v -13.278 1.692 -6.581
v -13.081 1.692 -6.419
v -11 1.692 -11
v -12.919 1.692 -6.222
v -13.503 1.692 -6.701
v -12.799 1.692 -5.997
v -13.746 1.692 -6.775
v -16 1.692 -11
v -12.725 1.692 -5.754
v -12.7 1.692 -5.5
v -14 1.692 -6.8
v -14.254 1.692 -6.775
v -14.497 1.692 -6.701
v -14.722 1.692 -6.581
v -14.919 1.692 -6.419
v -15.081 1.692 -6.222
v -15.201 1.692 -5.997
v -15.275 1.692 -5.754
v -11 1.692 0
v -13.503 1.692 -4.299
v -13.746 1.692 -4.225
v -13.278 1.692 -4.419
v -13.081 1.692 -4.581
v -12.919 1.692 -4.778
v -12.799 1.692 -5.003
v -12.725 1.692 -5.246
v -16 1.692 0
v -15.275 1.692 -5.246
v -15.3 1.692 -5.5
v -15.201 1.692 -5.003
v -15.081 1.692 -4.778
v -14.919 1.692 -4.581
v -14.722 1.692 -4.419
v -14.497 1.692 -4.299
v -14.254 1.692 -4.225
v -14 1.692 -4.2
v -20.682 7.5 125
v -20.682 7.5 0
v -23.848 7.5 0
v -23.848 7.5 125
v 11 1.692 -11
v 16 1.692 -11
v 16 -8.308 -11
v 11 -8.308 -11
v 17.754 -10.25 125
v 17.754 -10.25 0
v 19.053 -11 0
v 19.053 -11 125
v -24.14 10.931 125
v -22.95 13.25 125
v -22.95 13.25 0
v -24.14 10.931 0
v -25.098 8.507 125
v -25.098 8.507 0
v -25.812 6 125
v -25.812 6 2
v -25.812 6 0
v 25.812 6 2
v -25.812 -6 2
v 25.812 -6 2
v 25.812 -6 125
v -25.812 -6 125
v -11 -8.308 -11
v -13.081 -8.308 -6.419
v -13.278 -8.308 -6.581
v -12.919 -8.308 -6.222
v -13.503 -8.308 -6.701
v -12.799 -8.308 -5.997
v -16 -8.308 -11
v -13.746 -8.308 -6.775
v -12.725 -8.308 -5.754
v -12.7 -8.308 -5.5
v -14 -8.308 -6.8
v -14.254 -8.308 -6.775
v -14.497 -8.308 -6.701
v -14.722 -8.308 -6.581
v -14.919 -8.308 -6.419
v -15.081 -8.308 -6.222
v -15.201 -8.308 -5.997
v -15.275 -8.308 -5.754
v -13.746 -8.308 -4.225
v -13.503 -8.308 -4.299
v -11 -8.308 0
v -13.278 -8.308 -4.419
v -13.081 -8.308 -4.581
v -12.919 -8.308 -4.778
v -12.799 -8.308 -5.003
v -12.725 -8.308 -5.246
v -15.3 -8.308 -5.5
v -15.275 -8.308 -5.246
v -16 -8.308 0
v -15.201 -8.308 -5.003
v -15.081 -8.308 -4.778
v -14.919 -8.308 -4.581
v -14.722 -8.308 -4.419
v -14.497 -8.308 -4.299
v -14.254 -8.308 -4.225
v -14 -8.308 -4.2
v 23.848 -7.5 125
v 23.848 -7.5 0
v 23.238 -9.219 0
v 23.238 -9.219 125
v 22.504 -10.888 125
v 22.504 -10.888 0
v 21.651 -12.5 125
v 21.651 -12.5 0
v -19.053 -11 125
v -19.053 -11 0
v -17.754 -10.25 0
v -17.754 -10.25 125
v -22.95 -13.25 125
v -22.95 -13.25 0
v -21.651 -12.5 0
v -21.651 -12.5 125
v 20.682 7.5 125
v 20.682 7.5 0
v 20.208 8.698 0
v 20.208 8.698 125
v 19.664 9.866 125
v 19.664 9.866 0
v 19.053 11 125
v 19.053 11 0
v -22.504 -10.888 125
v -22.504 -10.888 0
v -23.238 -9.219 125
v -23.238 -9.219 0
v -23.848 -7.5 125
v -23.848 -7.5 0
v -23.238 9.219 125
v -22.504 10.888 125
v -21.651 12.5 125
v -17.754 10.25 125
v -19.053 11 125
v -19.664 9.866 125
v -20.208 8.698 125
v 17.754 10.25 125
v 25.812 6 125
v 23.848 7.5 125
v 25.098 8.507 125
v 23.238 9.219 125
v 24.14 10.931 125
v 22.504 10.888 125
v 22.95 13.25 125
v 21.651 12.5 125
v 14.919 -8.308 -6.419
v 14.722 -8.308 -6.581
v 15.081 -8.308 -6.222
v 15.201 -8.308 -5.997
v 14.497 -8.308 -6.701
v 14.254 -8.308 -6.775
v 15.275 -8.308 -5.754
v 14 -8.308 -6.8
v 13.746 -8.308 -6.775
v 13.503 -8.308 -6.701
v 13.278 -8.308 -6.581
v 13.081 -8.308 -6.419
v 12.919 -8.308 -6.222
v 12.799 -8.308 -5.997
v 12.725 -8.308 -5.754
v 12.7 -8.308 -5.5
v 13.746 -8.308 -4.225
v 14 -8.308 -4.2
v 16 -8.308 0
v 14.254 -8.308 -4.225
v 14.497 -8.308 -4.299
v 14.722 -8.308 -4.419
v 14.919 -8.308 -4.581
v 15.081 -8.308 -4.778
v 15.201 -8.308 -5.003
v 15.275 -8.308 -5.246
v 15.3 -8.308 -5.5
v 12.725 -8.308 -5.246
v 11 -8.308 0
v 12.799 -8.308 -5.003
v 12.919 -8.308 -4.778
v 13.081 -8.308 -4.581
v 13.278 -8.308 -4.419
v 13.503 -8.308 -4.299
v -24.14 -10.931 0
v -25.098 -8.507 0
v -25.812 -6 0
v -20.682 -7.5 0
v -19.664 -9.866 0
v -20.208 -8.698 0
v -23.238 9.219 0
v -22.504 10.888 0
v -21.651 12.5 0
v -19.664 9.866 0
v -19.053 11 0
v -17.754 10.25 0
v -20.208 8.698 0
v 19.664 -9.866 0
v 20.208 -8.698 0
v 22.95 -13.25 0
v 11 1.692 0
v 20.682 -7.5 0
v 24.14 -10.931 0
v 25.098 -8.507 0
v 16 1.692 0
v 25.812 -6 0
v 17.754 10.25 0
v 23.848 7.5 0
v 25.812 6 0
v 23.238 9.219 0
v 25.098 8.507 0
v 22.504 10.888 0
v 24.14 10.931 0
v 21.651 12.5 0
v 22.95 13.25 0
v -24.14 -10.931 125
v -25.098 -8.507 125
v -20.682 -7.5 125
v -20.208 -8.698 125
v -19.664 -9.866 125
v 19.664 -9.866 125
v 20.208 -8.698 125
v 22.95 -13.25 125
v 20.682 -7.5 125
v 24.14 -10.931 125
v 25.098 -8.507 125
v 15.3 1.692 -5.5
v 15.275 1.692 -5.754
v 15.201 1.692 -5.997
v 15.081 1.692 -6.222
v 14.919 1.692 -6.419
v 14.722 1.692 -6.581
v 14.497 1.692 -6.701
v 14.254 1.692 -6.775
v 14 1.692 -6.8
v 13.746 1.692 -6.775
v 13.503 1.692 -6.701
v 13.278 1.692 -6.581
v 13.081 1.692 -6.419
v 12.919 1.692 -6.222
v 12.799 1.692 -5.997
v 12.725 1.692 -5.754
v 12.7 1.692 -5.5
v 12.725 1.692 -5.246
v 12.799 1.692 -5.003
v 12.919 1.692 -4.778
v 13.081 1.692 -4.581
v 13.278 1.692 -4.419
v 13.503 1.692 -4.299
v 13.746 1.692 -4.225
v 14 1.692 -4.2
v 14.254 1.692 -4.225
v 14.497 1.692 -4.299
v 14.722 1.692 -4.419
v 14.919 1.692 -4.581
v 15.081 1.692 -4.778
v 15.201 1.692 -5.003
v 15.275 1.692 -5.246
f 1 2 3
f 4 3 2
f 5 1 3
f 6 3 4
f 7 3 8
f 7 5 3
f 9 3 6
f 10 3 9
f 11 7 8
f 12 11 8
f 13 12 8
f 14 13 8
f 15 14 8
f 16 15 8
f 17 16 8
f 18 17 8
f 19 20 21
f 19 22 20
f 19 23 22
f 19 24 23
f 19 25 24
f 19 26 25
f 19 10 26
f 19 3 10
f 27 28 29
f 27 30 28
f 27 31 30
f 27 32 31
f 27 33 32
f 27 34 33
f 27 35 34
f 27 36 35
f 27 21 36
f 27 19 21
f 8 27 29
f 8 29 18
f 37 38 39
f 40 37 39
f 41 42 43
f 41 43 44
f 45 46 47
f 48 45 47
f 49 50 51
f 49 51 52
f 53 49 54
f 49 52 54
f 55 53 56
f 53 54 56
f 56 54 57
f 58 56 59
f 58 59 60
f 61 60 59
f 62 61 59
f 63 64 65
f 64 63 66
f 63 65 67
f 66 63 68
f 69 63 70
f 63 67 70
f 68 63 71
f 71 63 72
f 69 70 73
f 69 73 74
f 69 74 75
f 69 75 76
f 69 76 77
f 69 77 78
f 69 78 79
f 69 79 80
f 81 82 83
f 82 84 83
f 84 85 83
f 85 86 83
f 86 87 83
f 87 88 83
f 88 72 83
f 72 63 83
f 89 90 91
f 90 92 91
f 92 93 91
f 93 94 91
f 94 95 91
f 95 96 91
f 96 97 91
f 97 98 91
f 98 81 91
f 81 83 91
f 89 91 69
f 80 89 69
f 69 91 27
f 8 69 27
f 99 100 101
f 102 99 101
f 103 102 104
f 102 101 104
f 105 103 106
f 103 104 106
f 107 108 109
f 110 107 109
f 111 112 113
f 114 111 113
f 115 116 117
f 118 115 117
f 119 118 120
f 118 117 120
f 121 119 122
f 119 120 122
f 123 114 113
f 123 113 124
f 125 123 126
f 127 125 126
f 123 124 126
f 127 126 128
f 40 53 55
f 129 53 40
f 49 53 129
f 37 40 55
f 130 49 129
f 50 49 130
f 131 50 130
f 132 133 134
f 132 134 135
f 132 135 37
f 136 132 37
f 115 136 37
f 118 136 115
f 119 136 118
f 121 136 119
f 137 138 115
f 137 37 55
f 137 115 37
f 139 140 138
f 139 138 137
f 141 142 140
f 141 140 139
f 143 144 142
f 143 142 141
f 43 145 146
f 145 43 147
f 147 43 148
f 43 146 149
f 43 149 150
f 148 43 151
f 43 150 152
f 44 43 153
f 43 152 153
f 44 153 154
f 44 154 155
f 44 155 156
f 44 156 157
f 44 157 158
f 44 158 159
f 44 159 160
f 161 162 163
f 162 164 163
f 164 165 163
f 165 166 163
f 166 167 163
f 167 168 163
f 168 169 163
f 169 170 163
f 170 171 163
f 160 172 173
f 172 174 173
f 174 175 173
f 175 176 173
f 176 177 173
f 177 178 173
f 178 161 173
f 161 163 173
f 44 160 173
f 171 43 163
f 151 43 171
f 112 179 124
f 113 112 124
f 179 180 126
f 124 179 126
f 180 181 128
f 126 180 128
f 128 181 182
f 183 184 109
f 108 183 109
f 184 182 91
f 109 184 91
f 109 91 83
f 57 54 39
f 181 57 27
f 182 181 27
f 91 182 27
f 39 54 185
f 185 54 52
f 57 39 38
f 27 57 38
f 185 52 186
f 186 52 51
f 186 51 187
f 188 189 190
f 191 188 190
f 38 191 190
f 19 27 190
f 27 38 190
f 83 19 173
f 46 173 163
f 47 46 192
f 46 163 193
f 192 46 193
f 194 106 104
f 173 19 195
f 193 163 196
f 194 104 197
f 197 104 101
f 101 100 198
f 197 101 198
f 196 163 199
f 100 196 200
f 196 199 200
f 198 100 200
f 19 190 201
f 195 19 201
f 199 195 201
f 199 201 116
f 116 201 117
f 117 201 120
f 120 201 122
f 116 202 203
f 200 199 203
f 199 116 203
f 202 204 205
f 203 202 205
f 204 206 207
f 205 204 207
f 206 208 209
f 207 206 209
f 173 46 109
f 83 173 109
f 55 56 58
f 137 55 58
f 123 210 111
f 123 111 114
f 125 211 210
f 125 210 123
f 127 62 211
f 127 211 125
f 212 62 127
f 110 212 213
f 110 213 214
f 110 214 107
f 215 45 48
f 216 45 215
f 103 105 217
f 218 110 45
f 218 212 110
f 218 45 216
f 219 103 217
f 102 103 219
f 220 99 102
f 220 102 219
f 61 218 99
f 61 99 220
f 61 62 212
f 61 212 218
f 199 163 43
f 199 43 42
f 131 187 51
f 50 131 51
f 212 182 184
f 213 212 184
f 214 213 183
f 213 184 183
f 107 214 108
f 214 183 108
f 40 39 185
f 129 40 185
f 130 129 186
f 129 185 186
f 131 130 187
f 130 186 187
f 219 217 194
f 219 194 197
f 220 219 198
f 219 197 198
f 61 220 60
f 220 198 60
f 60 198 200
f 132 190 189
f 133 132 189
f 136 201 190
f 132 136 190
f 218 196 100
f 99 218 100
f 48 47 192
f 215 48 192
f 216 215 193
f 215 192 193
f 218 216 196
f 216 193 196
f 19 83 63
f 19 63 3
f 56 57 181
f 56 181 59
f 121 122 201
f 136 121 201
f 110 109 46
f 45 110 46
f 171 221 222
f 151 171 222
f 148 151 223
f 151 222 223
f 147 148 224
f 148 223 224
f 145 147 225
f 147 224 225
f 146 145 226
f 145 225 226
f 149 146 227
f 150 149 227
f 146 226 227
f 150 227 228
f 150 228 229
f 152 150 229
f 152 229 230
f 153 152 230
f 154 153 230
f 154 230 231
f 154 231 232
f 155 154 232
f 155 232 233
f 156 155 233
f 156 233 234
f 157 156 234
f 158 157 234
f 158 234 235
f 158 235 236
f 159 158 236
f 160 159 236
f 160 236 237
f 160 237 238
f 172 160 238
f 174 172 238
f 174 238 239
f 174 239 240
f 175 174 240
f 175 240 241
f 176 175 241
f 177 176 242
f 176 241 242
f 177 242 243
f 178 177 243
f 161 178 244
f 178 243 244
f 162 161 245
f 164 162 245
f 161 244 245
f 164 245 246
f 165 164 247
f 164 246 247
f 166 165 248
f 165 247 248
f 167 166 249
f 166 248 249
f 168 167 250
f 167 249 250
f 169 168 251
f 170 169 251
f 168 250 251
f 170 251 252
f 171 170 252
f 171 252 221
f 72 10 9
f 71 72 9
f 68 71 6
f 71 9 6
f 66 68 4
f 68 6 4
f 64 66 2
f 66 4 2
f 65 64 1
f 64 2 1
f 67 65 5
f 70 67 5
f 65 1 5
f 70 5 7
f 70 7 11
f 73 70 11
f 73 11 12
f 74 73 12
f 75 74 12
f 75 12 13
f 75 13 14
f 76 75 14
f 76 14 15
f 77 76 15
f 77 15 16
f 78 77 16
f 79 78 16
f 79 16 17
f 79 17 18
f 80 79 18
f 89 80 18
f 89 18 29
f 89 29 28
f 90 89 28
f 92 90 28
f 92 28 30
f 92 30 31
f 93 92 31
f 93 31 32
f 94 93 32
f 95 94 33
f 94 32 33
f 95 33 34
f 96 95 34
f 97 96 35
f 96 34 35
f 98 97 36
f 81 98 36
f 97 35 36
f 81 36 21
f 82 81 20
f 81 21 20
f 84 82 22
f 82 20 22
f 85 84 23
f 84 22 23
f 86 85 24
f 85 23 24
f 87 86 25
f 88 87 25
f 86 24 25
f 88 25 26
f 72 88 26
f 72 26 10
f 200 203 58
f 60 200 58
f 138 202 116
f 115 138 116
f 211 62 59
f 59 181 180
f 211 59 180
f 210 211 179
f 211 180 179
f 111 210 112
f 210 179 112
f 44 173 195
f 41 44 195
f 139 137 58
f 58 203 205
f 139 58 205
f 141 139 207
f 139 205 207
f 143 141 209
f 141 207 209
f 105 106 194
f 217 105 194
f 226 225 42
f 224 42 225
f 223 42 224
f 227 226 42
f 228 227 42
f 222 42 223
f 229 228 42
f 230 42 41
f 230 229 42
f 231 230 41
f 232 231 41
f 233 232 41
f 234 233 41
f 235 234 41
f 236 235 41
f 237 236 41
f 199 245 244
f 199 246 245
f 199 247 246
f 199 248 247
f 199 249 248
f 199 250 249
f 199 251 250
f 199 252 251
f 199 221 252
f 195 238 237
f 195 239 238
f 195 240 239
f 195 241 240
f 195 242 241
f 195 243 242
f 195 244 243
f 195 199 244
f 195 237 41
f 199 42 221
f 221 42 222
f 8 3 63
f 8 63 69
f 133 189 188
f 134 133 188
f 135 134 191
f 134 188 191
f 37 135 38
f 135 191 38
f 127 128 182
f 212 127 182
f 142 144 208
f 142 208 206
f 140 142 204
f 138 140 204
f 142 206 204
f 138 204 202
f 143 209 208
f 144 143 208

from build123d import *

# Parameters (mm, degrees)
BOSS_EXTRUDE2_DEPTH = 125
SKETCH2_W           = 51.623637996
SKETCH2_H           = 2
BOSS_EXTRUDE3_DEPTH = 12
SKETCH3_W           = 5
SKETCH3_H           = 10
BOSS_EXTRUDE4_DEPTH = 11
CUT_EXTRUDE1_REACH  = 16.942
SKETCH4_R           = 1.3


with BuildPart() as part:
    # Model → Boss-Extrude2 (new body)
    with BuildSketch(Plane.XY):
        with BuildLine():
            ThreePointArc((25.811818998, 6), (24.648760727, 9.730806474), (22.9496732, 13.25))
            Line((22.9496732, 13.25), (21.650635095, 12.5))
            ThreePointArc((21.650635095, 12.5), (22.886510643, 10.060200326), (23.848480035, 7.5))
            ThreePointArc((23.848480035, 7.5), (24.070588339, 6.753278984), (24.269322199, 6))
            Line((24.269322199, 6), (25.811818998, 6))
        make_face()
        with BuildLine():
            ThreePointArc((24.269322199, 6), (24.070588339, 6.753278984), (23.848480035, 7.5))
            Line((23.848480035, 7.5), (23.323807579, 7.5))
            Line((23.323807579, 7.5), (21.213203436, 7.5))
            Line((21.213203436, 7.5), (20.68211788, 7.5))
            ThreePointArc((20.68211788, 7.5), (20.937501331, 6.754334757), (21.166010489, 6))
            Line((21.166010489, 6), (24.269322199, 6))
        make_face()
        with BuildLine():
            Line((19.602295784, 6), (21.166010489, 6))
            ThreePointArc((21.166010489, 6), (20.937501331, 6.754334757), (20.68211788, 7.5))
            ThreePointArc((20.68211788, 7.5), (19.944263194, 9.285815292), (19.052558883, 11))
            Line((19.052558883, 11), (17.753520778, 10.25))
            ThreePointArc((17.753520778, 10.25), (18.798401069, 8.177415072), (19.602295784, 6))
        make_face()
        with BuildLine():
            Line((10.392304845, 6), (19.602295784, 6))
            ThreePointArc((19.602295784, 6), (18.798401069, 8.177415072), (17.753520778, 10.25))
            Line((17.753520778, 10.25), (10.392304845, 6))
        make_face()
        Polygon((17.753520778, 10.25), (-17.753520778, 10.25), (-10.392304845, 6), (10.392304845, 6), align=None)
        with BuildLine():
            Line((-17.753520778, 10.25), (-19.052558883, 11))
            ThreePointArc((-19.052558883, 11), (-19.944263194, 9.285815292), (-20.68211788, 7.5))
            ThreePointArc((-20.68211788, 7.5), (-20.937501331, 6.754334757), (-21.166010489, 6))
            Line((-21.166010489, 6), (-19.602295784, 6))
            ThreePointArc((-19.602295784, 6), (-18.798401069, 8.177415072), (-17.753520778, 10.25))
        make_face()
        with BuildLine():
            Line((-21.213203436, 7.5), (-23.323807579, 7.5))
            ThreePointArc((-23.323807579, 7.5), (-23.550822597, 6.753425426), (-23.75394704, 6))
            Line((-23.75394704, 6), (-21.685248442, 6))
            ThreePointArc((-21.685248442, 6), (-21.462334295, 6.754125156), (-21.213203436, 7.5))
        make_face()
        with BuildLine():
            Line((-23.323807579, 7.5), (-23.848480035, 7.5))
            ThreePointArc((-23.848480035, 7.5), (-24.070588339, 6.753278984), (-24.269322199, 6))
            Line((-24.269322199, 6), (-23.75394704, 6))
            ThreePointArc((-23.75394704, 6), (-23.550822597, 6.753425426), (-23.323807579, 7.5))
        make_face()
        with BuildLine():
            Line((-20.68211788, 7.5), (-21.213203436, 7.5))
            ThreePointArc((-21.213203436, 7.5), (-21.462334295, 6.754125156), (-21.685248442, 6))
            Line((-21.685248442, 6), (-21.166010489, 6))
            ThreePointArc((-21.166010489, 6), (-20.937501331, 6.754334757), (-20.68211788, 7.5))
        make_face()
        with BuildLine():
            Line((-21.650635095, 12.5), (-22.9496732, 13.25))
            ThreePointArc((-22.9496732, 13.25), (-24.648760727, 9.730806474), (-25.811818998, 6))
            Line((-25.811818998, 6), (-24.269322199, 6))
            ThreePointArc((-24.269322199, 6), (-24.070588339, 6.753278984), (-23.848480035, 7.5))
            ThreePointArc((-23.848480035, 7.5), (-22.886510643, 10.060200326), (-21.650635095, 12.5))
        make_face()
        with BuildLine():
            Line((-10.392304845, 6), (-17.753520778, 10.25))
            ThreePointArc((-17.753520778, 10.25), (-18.798401069, 8.177415072), (-19.602295784, 6))
            Line((-19.602295784, 6), (-10.392304845, 6))
        make_face()
        with BuildLine():
            Line((-24.269322199, -6), (-25.811818998, -6))
            ThreePointArc((-25.811818998, -6), (-24.648760727, -9.730806474), (-22.9496732, -13.25))
            Line((-22.9496732, -13.25), (-21.650635095, -12.5))
            ThreePointArc((-21.650635095, -12.5), (-22.886510643, -10.060200326), (-23.848480035, -7.5))
            ThreePointArc((-23.848480035, -7.5), (-24.070588339, -6.753278984), (-24.269322199, -6))
        make_face()
        with BuildLine():
            Line((-23.75394704, -6), (-24.269322199, -6))
            ThreePointArc((-24.269322199, -6), (-24.070588339, -6.753278984), (-23.848480035, -7.5))
            Line((-23.848480035, -7.5), (-23.323807579, -7.5))
            ThreePointArc((-23.323807579, -7.5), (-23.550822597, -6.753425426), (-23.75394704, -6))
        make_face()
        with BuildLine():
            Line((-21.685248442, -6), (-23.75394704, -6))
            ThreePointArc((-23.75394704, -6), (-23.550822597, -6.753425426), (-23.323807579, -7.5))
            Line((-23.323807579, -7.5), (-21.213203436, -7.5))
            ThreePointArc((-21.213203436, -7.5), (-21.462334295, -6.754125156), (-21.685248442, -6))
        make_face()
        with BuildLine():
            Line((-21.166010489, -6), (-21.685248442, -6))
            ThreePointArc((-21.685248442, -6), (-21.462334295, -6.754125156), (-21.213203436, -7.5))
            Line((-21.213203436, -7.5), (-20.68211788, -7.5))
            ThreePointArc((-20.68211788, -7.5), (-20.937501331, -6.754334757), (-21.166010489, -6))
        make_face()
        with BuildLine():
            Line((-19.602295784, -6), (-21.166010489, -6))
            ThreePointArc((-21.166010489, -6), (-20.937501331, -6.754334757), (-20.68211788, -7.5))
            ThreePointArc((-20.68211788, -7.5), (-19.944263194, -9.285815292), (-19.052558883, -11))
            Line((-19.052558883, -11), (-17.753520778, -10.25))
            ThreePointArc((-17.753520778, -10.25), (-18.798401069, -8.177415072), (-19.602295784, -6))
        make_face()
        with BuildLine():
            Line((-17.753520778, -10.25), (-10.392304845, -6))
            Line((-10.392304845, -6), (-19.602295784, -6))
            ThreePointArc((-19.602295784, -6), (-18.798401069, -8.177415072), (-17.753520778, -10.25))
        make_face()
        Polygon((17.753520778, -10.25), (10.392304845, -6), (-10.392304845, -6), (-17.753520778, -10.25), align=None)
        with BuildLine():
            ThreePointArc((17.753520778, -10.25), (18.798401069, -8.177415072), (19.602295784, -6))
            Line((19.602295784, -6), (10.392304845, -6))
            Line((10.392304845, -6), (17.753520778, -10.25))
        make_face()
        with BuildLine():
            ThreePointArc((20.68211788, -7.5), (20.937501331, -6.754334757), (21.166010489, -6))
            Line((21.166010489, -6), (19.602295784, -6))
            ThreePointArc((19.602295784, -6), (18.798401069, -8.177415072), (17.753520778, -10.25))
            Line((17.753520778, -10.25), (19.052558883, -11))
            ThreePointArc((19.052558883, -11), (19.944263194, -9.285815292), (20.68211788, -7.5))
        make_face()
        with BuildLine():
            ThreePointArc((23.848480035, -7.5), (24.070588339, -6.753278984), (24.269322199, -6))
            Line((24.269322199, -6), (21.166010489, -6))
            ThreePointArc((21.166010489, -6), (20.937501331, -6.754334757), (20.68211788, -7.5))
            Line((20.68211788, -7.5), (21.213203436, -7.5))
            Line((21.213203436, -7.5), (23.323807579, -7.5))
            Line((23.323807579, -7.5), (23.848480035, -7.5))
        make_face()
        with BuildLine():
            ThreePointArc((22.9496732, -13.25), (24.648760727, -9.730806474), (25.811818998, -6))
            Line((25.811818998, -6), (24.269322199, -6))
            ThreePointArc((24.269322199, -6), (24.070588339, -6.753278984), (23.848480035, -7.5))
            ThreePointArc((23.848480035, -7.5), (22.886510643, -10.060200326), (21.650635095, -12.5))
            Line((21.650635095, -12.5), (22.9496732, -13.25))
        make_face()
    extrude(amount=BOSS_EXTRUDE2_DEPTH)

    # Sketch2 → Boss-Extrude3 (add)
    with BuildSketch(Plane.XZ.offset(-6)):
        with Locations((0, 1)):
            Rectangle(SKETCH2_W, SKETCH2_H)
    extrude(amount=BOSS_EXTRUDE3_DEPTH)

    # Sketch3 → Boss-Extrude4 (add)
    with BuildSketch(Plane(origin=(0, 0, 0), x_dir=(-1, 0, 0), z_dir=(0, 0, -1))):
        with Locations((-13.5, -3.307781384)):
            Rectangle(SKETCH3_W, SKETCH3_H)
        with Locations((13.5, -3.307781384)):
            Rectangle(SKETCH3_W, SKETCH3_H)
    extrude(amount=BOSS_EXTRUDE4_DEPTH)

    # Sketch4 → Cut-Extrude1 (cut, up to next)
    with BuildSketch(Plane(origin=(0, 1.692218616, 0), x_dir=(1, 0, 0), z_dir=(0, 1, 0)), mode=Mode.PRIVATE) as cut_extrude1_sk1:
        with Locations((14, 5.5)):
            Circle(SKETCH4_R)
    cut_extrude1_tool1 = extrude(cut_extrude1_sk1.sketch, amount=-CUT_EXTRUDE1_REACH, mode=Mode.PRIVATE) & part.part
    add(cut_extrude1_tool1.solids().sort_by_distance((14, 1.692219, -5.5))[0], mode=Mode.SUBTRACT)
    # Sketch4 → Cut-Extrude1 (cut, up to next)
    with BuildSketch(Plane(origin=(0, 1.692218616, 0), x_dir=(1, 0, 0), z_dir=(0, 1, 0)), mode=Mode.PRIVATE) as cut_extrude1_sk2:
        with Locations((-14, 5.5)):
            Circle(SKETCH4_R)
    cut_extrude1_tool2 = extrude(cut_extrude1_sk2.sketch, amount=-CUT_EXTRUDE1_REACH, mode=Mode.PRIVATE) & part.part
    add(cut_extrude1_tool2.solids().sort_by_distance((-14, 1.692219, -5.5))[0], mode=Mode.SUBTRACT)


solid = part.part
